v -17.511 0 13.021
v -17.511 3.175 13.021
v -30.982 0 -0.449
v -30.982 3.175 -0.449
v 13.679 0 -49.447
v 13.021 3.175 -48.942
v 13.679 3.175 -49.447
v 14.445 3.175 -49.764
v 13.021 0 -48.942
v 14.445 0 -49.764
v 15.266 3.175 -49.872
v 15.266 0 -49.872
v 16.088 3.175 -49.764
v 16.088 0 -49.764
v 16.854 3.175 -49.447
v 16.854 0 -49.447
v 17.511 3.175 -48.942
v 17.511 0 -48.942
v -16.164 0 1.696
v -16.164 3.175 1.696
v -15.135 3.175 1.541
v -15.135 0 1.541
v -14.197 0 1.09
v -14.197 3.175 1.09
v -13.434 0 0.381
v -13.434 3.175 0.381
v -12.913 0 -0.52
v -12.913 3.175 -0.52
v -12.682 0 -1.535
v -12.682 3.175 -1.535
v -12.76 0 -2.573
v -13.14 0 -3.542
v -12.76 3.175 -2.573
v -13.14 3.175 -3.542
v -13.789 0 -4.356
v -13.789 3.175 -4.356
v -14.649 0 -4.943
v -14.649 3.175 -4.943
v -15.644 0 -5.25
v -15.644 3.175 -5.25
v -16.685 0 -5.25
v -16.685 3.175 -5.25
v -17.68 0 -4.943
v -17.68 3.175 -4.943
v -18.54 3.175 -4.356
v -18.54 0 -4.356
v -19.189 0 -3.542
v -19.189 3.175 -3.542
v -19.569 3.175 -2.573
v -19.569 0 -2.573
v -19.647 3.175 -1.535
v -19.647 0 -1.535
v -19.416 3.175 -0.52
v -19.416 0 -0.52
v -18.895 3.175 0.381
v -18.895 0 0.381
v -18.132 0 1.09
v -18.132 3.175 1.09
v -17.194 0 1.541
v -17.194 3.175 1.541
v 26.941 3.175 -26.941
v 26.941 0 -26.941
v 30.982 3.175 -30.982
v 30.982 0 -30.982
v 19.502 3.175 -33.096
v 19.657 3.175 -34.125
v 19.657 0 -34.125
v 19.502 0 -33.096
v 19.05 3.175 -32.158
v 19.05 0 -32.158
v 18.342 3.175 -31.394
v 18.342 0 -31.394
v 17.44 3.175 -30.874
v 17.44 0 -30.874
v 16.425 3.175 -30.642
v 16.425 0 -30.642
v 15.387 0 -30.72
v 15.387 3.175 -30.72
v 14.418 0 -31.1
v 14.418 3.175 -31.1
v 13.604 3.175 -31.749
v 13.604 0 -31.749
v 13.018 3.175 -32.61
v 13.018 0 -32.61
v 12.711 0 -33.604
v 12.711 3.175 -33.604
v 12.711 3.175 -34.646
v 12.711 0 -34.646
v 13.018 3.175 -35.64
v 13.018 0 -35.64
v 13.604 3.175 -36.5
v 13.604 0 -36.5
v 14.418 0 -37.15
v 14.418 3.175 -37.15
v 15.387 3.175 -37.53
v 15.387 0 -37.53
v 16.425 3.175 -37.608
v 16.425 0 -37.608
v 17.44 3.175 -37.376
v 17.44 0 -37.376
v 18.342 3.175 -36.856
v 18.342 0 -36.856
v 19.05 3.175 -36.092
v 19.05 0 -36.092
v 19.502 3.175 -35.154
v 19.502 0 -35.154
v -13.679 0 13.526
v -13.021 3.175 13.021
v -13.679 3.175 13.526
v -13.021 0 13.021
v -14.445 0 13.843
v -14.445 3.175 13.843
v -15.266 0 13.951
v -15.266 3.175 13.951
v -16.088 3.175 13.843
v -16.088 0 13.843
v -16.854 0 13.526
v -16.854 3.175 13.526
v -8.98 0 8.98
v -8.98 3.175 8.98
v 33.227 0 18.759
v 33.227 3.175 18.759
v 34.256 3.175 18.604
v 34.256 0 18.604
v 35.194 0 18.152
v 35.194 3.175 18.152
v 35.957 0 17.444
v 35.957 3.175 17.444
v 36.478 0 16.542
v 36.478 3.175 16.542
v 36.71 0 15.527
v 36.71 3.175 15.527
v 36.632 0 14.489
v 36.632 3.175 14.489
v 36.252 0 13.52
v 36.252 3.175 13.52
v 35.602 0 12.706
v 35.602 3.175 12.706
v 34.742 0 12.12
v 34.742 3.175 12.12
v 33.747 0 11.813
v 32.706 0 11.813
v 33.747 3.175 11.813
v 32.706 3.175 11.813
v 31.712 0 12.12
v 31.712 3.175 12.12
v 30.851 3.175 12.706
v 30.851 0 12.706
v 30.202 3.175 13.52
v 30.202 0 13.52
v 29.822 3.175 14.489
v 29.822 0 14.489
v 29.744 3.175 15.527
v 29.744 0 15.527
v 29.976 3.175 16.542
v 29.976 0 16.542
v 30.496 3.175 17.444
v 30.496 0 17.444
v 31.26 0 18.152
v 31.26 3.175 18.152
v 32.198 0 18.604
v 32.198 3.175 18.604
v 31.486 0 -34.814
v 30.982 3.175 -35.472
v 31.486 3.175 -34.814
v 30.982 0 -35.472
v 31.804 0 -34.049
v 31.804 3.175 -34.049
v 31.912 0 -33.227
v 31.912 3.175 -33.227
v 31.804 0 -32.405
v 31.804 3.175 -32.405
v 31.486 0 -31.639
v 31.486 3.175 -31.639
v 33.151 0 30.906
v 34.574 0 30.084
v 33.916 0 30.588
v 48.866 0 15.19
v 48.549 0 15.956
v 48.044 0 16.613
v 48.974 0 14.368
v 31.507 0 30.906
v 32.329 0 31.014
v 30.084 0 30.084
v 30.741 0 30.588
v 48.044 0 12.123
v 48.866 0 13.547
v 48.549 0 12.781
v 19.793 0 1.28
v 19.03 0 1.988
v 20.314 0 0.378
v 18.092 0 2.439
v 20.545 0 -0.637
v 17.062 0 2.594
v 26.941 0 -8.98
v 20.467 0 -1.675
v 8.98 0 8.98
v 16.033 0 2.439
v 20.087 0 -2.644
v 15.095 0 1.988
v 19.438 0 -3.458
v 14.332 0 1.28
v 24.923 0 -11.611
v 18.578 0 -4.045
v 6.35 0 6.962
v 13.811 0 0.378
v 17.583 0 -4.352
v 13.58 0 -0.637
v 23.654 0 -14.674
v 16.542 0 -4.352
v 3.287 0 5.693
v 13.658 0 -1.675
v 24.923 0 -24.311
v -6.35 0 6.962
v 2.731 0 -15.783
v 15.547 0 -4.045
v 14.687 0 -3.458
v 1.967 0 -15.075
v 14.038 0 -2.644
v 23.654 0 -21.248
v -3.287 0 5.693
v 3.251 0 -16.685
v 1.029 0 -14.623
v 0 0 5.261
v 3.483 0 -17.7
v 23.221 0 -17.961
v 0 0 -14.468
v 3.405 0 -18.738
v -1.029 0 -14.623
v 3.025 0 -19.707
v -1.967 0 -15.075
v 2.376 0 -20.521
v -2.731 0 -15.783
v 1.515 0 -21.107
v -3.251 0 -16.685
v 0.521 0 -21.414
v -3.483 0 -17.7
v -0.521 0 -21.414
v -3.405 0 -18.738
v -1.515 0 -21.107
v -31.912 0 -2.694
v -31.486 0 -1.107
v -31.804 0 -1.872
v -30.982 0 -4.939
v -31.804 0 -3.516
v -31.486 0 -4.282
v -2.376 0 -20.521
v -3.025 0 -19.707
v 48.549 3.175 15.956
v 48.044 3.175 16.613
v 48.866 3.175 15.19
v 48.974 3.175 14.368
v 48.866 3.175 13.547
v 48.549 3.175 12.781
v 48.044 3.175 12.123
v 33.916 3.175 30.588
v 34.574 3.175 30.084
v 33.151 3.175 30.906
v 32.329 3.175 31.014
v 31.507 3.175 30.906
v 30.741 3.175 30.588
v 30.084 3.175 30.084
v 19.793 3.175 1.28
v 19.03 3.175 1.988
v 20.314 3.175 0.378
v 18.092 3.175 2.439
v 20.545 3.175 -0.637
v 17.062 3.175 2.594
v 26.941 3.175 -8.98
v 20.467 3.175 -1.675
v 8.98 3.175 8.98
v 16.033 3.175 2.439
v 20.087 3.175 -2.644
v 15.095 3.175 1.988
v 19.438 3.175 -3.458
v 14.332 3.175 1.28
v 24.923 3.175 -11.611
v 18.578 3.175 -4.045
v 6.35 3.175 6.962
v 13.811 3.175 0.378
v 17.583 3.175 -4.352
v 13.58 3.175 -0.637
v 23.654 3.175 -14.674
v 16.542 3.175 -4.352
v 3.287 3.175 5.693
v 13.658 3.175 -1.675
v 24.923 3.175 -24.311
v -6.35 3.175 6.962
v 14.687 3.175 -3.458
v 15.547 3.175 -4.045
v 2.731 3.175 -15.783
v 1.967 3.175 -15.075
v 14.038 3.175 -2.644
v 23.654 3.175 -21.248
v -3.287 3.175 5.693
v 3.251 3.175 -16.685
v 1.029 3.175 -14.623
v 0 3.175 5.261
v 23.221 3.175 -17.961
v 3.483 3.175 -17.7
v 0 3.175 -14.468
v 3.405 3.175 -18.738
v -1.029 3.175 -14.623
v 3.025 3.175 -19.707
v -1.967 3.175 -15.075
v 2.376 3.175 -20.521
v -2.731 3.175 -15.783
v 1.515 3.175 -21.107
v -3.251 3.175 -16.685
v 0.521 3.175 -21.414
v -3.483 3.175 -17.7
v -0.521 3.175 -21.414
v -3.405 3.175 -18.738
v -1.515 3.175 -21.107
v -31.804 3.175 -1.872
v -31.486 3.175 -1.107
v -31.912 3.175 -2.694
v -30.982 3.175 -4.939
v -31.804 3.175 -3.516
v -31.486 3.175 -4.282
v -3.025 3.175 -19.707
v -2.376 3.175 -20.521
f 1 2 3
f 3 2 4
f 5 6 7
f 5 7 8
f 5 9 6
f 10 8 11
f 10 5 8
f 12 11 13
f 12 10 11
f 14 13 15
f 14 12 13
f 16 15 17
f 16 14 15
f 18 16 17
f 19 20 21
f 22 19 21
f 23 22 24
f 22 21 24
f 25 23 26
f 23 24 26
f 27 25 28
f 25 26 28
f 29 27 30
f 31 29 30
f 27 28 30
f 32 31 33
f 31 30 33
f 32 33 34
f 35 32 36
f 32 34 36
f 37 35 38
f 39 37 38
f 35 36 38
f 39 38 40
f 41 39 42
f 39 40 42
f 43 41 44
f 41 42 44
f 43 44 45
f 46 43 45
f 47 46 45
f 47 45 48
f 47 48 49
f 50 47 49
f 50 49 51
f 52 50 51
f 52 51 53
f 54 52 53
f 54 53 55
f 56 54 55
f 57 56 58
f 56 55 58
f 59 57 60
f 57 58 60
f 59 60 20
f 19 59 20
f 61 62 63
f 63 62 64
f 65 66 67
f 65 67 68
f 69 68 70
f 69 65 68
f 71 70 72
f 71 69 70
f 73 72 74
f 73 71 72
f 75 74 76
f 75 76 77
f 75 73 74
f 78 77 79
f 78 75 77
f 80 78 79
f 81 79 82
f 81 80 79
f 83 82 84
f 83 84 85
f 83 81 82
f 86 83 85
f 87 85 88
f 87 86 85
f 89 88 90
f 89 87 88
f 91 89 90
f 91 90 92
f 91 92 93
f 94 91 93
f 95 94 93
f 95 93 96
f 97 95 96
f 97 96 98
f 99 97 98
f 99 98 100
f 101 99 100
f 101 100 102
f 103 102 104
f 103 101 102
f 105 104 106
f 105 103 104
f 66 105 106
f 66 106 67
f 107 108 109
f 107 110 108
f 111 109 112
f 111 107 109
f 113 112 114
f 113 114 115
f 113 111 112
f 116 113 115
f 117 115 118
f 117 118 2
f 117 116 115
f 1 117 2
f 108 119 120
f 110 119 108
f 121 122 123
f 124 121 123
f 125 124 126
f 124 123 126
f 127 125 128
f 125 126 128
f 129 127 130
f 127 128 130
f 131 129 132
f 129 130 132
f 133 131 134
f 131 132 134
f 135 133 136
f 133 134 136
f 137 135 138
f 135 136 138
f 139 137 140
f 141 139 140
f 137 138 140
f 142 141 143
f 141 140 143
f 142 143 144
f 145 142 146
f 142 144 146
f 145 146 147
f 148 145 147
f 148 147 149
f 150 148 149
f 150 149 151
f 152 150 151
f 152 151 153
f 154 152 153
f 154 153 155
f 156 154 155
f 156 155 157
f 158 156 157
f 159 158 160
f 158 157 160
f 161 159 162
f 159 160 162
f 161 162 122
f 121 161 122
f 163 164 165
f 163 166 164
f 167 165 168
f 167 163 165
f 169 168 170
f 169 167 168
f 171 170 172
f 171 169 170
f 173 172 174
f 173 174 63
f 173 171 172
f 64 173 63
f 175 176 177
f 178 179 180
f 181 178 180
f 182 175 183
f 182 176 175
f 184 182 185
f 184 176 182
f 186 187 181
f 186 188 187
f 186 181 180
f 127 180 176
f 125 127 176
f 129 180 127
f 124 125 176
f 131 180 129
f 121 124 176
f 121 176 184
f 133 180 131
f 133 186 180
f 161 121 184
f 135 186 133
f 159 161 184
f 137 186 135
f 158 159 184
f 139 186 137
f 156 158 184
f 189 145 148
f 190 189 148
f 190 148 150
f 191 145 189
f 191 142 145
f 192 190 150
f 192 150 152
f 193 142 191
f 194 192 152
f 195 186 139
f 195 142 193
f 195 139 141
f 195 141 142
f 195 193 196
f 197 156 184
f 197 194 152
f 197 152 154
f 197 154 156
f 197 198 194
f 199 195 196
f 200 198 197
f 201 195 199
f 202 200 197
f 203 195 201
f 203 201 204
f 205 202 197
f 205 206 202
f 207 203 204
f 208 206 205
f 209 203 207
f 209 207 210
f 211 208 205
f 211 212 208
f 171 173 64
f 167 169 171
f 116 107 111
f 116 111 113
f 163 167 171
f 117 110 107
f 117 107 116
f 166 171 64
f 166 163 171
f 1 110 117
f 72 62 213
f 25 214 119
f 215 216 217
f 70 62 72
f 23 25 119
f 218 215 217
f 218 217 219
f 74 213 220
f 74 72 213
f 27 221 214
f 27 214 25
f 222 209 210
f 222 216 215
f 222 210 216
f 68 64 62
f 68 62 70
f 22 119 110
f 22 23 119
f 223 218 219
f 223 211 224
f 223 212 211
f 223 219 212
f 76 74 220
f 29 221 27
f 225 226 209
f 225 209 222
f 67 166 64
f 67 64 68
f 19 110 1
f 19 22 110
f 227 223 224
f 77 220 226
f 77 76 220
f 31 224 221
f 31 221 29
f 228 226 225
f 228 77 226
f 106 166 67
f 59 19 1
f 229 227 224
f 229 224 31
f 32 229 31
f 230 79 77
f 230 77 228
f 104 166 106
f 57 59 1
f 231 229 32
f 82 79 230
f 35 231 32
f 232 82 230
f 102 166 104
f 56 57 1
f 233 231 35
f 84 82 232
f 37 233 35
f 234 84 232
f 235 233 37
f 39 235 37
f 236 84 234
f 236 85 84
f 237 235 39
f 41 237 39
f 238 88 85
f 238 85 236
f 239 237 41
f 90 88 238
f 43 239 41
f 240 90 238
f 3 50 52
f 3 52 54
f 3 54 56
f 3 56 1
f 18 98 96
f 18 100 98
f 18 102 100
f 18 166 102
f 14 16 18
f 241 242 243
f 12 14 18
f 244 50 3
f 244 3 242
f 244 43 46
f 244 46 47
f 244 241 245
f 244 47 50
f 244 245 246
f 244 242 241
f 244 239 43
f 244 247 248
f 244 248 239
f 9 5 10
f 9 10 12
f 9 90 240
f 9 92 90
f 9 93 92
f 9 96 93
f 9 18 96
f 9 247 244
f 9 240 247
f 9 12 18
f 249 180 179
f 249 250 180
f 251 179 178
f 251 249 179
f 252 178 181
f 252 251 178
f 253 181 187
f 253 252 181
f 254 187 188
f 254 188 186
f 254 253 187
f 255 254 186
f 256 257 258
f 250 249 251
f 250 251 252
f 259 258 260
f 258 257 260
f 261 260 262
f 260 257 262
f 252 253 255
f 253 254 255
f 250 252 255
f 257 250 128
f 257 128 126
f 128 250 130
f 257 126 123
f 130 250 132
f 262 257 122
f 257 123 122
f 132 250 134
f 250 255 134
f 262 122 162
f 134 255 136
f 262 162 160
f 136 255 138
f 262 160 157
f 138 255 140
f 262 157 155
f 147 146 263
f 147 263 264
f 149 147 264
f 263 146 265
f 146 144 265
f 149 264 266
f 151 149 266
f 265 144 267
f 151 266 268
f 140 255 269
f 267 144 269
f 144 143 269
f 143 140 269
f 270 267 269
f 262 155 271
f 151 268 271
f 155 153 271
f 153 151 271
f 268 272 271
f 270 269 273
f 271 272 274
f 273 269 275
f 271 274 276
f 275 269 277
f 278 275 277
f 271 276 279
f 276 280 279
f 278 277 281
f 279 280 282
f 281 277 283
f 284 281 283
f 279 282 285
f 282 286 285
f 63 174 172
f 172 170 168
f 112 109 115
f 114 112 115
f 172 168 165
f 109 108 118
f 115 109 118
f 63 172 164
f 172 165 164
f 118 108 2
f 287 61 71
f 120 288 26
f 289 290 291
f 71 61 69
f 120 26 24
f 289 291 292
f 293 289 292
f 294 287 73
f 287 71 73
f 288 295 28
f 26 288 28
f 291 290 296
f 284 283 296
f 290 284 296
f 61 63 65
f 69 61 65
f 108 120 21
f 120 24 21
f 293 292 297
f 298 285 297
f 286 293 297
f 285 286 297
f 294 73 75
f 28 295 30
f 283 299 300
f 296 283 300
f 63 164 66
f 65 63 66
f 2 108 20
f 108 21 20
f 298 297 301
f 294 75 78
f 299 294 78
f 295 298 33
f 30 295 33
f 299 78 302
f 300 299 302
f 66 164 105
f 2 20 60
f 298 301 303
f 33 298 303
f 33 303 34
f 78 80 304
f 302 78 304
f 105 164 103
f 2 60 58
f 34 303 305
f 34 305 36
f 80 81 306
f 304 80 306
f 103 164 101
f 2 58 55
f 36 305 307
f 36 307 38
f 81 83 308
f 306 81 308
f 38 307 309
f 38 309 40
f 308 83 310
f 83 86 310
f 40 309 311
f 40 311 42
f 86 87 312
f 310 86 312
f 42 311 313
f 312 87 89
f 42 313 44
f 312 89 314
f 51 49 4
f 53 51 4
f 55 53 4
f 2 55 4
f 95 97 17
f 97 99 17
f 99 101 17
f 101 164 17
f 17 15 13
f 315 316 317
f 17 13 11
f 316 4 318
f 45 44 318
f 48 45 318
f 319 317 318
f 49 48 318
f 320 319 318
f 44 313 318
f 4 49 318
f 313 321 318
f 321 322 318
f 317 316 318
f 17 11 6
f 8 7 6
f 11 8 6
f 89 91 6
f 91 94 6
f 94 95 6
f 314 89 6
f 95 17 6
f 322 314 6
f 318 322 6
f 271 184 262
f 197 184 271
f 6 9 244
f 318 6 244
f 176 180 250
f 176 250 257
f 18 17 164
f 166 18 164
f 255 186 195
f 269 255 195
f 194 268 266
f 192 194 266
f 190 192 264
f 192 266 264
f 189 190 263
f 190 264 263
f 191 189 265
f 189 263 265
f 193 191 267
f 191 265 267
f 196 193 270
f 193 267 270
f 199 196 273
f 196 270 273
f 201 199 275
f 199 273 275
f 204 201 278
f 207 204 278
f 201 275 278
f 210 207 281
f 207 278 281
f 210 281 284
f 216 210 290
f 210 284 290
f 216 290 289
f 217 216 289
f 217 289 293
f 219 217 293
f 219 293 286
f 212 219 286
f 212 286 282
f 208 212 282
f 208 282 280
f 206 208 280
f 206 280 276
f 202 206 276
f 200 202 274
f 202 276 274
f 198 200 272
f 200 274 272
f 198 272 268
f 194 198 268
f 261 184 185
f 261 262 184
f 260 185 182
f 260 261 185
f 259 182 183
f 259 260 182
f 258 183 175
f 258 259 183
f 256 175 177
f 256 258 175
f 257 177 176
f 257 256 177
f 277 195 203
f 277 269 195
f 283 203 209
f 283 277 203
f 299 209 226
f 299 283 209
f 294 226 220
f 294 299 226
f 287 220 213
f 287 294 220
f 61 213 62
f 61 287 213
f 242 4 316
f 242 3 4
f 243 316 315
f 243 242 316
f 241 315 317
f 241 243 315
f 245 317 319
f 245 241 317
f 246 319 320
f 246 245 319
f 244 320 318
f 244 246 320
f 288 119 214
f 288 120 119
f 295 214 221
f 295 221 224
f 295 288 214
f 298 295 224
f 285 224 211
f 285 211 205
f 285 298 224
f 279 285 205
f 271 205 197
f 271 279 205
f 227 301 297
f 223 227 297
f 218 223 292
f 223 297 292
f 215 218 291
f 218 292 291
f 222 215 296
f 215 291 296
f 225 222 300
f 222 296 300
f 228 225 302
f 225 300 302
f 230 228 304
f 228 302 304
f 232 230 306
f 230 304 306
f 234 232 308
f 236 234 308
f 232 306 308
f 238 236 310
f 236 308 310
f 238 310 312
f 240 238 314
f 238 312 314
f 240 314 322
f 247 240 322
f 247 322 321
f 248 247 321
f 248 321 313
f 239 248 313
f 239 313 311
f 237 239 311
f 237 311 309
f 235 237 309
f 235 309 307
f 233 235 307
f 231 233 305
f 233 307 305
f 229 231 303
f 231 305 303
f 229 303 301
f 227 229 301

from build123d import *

# Parameters (mm, degrees)
BOSS_EXTRUDE1_DEPTH = 3.175
SKETCH2_R           = 3.4925
CUT_EXTRUDE2_DEPTH  = 3.175
LPATTERN5_COUNT     = 3
LPATTERN5_PITCH     = 22.86
SKETCH7_R           = 3.4925
CUT_EXTRUDE3_DEPTH  = 3.175
LPATTERN6_COUNT     = 2
LPATTERN6_PITCH     = 22.86
SKETCH8_R           = 3.4925
CUT_EXTRUDE4_DEPTH  = 85.115331985
FILLET3_R           = 12.7
FILLET4_R           = 3.175


with BuildPart() as part:
    # Sketch1 → Boss-Extrude1 (new body)
    with BuildSketch(Plane(origin=(0, 0, 0), x_dir=(1, 0, 0), z_dir=(0, 1, 0))):
        Polygon((-17.960512242, 17.960512242), (0, 35.921024484), (17.960512242, 17.960512242), (50.289434278, -14.368409794), (32.328922036, -32.328922036), (0, 0), (-31.430896424, -31.430896424), (-49.391408666, -13.470384182), align=None)
    extrude(amount=BOSS_EXTRUDE1_DEPTH)

    # Sketch2 → Cut-Extrude2 (cut)
    with BuildSketch(Plane(origin=(0, 3.175, 0), x_dir=(1, 0, 0), z_dir=(0, 1, 0))):
        with Locations(Location((-32.328922036, -14.368409794, 0), (0, 0, 270))):
            Circle(SKETCH2_R)
    cut_extrude2 = extrude(amount=-CUT_EXTRUDE2_DEPTH, mode=Mode.SUBTRACT)

    # LPattern5: Cut-Extrude2 ×3
    with Locations(*[Vector(0.7071067811865467, 0, -0.7071067811865485) * (i * LPATTERN5_PITCH) for i in range(1, LPATTERN5_COUNT)]):
        add(cut_extrude2, mode=Mode.SUBTRACT)

    # Sketch7 → Cut-Extrude3 (cut)
    with BuildSketch(Plane(origin=(0, 3.175, 0), x_dir=(1, 0, 0), z_dir=(0, 1, 0))):
        with Locations(Location((33.226947648, -15.266435406, 0), (0, 0, 270))):
            Circle(SKETCH7_R)
    cut_extrude3 = extrude(amount=-CUT_EXTRUDE3_DEPTH, mode=Mode.SUBTRACT)

    # LPattern6: Cut-Extrude3 ×2
    with Locations(*[Vector(-0.7071067811865457, 0, -0.7071067811865493) * (i * LPATTERN6_PITCH) for i in range(1, LPATTERN6_COUNT)]):
        add(cut_extrude3, mode=Mode.SUBTRACT)

    # Mirror2: part across plane


with BuildPart() as part_1:
    add(part.part)
    add(part.part.mirror(Plane(origin=(8.980256121, 0, -8.980256121), x_dir=(0.7071067811865464, 0, 0.7071067811865487), z_dir=(-0.7071067811865489, 0, 0.7071067811865462))))

    # Sketch8 → Cut-Extrude4 (cut, through all)
    # profile 1 of 2: a face of its own
    with BuildSketch(Plane(origin=(0, 3.175, 0), x_dir=(1, 0, 0), z_dir=(0, 1, 0))):
        Polygon((-15.266435406, -15.266435406), (-33.226947648, 2.694076836), (-49.391408666, -13.470384182), (-31.430896424, -31.430896424), align=None)
        with Locations((-32.328922036, -14.368409794)):
            Circle(SKETCH8_R, mode=Mode.SUBTRACT)
    # profile 2 of 2: a face of its own
    with BuildSketch(Plane(origin=(0, 3.175, 0), x_dir=(1, 0, 0), z_dir=(0, 1, 0))):
        Polygon((33.226947648, 33.226947648), (49.391408666, 49.391408666), (31.430896424, 67.351920908), (15.266435406, 51.18745989), align=None)
        with Locations((32.328922036, 50.289434278)):
            Circle(SKETCH8_R, mode=Mode.SUBTRACT)
    extrude(amount=-CUT_EXTRUDE4_DEPTH, mode=Mode.SUBTRACT)

    # Fillet3
    fillet3_edges = [part_1.edges().sort_by_distance(p)[0] for p in [
        (0, 1.5875, 0),
        (17.960512242, 1.5875, -17.960512242),
    ]]
    fillet(fillet3_edges, radius=FILLET3_R)

    # Fillet4
    fillet4_edges = [part_1.edges().sort_by_distance(p)[0] for p in [
        (15.266435406, 1.5875, -51.18745989),
        (33.226947648, 1.5875, -33.226947648),
        (50.289434278, 1.5875, 14.368409794),
        (32.328922036, 1.5875, 32.328922036),
        (-33.226947648, 1.5875, -2.694076836),
        (-15.266435406, 1.5875, 15.266435406),
    ]]
    fillet(fillet4_edges, radius=FILLET4_R)


solid = part_1.part
